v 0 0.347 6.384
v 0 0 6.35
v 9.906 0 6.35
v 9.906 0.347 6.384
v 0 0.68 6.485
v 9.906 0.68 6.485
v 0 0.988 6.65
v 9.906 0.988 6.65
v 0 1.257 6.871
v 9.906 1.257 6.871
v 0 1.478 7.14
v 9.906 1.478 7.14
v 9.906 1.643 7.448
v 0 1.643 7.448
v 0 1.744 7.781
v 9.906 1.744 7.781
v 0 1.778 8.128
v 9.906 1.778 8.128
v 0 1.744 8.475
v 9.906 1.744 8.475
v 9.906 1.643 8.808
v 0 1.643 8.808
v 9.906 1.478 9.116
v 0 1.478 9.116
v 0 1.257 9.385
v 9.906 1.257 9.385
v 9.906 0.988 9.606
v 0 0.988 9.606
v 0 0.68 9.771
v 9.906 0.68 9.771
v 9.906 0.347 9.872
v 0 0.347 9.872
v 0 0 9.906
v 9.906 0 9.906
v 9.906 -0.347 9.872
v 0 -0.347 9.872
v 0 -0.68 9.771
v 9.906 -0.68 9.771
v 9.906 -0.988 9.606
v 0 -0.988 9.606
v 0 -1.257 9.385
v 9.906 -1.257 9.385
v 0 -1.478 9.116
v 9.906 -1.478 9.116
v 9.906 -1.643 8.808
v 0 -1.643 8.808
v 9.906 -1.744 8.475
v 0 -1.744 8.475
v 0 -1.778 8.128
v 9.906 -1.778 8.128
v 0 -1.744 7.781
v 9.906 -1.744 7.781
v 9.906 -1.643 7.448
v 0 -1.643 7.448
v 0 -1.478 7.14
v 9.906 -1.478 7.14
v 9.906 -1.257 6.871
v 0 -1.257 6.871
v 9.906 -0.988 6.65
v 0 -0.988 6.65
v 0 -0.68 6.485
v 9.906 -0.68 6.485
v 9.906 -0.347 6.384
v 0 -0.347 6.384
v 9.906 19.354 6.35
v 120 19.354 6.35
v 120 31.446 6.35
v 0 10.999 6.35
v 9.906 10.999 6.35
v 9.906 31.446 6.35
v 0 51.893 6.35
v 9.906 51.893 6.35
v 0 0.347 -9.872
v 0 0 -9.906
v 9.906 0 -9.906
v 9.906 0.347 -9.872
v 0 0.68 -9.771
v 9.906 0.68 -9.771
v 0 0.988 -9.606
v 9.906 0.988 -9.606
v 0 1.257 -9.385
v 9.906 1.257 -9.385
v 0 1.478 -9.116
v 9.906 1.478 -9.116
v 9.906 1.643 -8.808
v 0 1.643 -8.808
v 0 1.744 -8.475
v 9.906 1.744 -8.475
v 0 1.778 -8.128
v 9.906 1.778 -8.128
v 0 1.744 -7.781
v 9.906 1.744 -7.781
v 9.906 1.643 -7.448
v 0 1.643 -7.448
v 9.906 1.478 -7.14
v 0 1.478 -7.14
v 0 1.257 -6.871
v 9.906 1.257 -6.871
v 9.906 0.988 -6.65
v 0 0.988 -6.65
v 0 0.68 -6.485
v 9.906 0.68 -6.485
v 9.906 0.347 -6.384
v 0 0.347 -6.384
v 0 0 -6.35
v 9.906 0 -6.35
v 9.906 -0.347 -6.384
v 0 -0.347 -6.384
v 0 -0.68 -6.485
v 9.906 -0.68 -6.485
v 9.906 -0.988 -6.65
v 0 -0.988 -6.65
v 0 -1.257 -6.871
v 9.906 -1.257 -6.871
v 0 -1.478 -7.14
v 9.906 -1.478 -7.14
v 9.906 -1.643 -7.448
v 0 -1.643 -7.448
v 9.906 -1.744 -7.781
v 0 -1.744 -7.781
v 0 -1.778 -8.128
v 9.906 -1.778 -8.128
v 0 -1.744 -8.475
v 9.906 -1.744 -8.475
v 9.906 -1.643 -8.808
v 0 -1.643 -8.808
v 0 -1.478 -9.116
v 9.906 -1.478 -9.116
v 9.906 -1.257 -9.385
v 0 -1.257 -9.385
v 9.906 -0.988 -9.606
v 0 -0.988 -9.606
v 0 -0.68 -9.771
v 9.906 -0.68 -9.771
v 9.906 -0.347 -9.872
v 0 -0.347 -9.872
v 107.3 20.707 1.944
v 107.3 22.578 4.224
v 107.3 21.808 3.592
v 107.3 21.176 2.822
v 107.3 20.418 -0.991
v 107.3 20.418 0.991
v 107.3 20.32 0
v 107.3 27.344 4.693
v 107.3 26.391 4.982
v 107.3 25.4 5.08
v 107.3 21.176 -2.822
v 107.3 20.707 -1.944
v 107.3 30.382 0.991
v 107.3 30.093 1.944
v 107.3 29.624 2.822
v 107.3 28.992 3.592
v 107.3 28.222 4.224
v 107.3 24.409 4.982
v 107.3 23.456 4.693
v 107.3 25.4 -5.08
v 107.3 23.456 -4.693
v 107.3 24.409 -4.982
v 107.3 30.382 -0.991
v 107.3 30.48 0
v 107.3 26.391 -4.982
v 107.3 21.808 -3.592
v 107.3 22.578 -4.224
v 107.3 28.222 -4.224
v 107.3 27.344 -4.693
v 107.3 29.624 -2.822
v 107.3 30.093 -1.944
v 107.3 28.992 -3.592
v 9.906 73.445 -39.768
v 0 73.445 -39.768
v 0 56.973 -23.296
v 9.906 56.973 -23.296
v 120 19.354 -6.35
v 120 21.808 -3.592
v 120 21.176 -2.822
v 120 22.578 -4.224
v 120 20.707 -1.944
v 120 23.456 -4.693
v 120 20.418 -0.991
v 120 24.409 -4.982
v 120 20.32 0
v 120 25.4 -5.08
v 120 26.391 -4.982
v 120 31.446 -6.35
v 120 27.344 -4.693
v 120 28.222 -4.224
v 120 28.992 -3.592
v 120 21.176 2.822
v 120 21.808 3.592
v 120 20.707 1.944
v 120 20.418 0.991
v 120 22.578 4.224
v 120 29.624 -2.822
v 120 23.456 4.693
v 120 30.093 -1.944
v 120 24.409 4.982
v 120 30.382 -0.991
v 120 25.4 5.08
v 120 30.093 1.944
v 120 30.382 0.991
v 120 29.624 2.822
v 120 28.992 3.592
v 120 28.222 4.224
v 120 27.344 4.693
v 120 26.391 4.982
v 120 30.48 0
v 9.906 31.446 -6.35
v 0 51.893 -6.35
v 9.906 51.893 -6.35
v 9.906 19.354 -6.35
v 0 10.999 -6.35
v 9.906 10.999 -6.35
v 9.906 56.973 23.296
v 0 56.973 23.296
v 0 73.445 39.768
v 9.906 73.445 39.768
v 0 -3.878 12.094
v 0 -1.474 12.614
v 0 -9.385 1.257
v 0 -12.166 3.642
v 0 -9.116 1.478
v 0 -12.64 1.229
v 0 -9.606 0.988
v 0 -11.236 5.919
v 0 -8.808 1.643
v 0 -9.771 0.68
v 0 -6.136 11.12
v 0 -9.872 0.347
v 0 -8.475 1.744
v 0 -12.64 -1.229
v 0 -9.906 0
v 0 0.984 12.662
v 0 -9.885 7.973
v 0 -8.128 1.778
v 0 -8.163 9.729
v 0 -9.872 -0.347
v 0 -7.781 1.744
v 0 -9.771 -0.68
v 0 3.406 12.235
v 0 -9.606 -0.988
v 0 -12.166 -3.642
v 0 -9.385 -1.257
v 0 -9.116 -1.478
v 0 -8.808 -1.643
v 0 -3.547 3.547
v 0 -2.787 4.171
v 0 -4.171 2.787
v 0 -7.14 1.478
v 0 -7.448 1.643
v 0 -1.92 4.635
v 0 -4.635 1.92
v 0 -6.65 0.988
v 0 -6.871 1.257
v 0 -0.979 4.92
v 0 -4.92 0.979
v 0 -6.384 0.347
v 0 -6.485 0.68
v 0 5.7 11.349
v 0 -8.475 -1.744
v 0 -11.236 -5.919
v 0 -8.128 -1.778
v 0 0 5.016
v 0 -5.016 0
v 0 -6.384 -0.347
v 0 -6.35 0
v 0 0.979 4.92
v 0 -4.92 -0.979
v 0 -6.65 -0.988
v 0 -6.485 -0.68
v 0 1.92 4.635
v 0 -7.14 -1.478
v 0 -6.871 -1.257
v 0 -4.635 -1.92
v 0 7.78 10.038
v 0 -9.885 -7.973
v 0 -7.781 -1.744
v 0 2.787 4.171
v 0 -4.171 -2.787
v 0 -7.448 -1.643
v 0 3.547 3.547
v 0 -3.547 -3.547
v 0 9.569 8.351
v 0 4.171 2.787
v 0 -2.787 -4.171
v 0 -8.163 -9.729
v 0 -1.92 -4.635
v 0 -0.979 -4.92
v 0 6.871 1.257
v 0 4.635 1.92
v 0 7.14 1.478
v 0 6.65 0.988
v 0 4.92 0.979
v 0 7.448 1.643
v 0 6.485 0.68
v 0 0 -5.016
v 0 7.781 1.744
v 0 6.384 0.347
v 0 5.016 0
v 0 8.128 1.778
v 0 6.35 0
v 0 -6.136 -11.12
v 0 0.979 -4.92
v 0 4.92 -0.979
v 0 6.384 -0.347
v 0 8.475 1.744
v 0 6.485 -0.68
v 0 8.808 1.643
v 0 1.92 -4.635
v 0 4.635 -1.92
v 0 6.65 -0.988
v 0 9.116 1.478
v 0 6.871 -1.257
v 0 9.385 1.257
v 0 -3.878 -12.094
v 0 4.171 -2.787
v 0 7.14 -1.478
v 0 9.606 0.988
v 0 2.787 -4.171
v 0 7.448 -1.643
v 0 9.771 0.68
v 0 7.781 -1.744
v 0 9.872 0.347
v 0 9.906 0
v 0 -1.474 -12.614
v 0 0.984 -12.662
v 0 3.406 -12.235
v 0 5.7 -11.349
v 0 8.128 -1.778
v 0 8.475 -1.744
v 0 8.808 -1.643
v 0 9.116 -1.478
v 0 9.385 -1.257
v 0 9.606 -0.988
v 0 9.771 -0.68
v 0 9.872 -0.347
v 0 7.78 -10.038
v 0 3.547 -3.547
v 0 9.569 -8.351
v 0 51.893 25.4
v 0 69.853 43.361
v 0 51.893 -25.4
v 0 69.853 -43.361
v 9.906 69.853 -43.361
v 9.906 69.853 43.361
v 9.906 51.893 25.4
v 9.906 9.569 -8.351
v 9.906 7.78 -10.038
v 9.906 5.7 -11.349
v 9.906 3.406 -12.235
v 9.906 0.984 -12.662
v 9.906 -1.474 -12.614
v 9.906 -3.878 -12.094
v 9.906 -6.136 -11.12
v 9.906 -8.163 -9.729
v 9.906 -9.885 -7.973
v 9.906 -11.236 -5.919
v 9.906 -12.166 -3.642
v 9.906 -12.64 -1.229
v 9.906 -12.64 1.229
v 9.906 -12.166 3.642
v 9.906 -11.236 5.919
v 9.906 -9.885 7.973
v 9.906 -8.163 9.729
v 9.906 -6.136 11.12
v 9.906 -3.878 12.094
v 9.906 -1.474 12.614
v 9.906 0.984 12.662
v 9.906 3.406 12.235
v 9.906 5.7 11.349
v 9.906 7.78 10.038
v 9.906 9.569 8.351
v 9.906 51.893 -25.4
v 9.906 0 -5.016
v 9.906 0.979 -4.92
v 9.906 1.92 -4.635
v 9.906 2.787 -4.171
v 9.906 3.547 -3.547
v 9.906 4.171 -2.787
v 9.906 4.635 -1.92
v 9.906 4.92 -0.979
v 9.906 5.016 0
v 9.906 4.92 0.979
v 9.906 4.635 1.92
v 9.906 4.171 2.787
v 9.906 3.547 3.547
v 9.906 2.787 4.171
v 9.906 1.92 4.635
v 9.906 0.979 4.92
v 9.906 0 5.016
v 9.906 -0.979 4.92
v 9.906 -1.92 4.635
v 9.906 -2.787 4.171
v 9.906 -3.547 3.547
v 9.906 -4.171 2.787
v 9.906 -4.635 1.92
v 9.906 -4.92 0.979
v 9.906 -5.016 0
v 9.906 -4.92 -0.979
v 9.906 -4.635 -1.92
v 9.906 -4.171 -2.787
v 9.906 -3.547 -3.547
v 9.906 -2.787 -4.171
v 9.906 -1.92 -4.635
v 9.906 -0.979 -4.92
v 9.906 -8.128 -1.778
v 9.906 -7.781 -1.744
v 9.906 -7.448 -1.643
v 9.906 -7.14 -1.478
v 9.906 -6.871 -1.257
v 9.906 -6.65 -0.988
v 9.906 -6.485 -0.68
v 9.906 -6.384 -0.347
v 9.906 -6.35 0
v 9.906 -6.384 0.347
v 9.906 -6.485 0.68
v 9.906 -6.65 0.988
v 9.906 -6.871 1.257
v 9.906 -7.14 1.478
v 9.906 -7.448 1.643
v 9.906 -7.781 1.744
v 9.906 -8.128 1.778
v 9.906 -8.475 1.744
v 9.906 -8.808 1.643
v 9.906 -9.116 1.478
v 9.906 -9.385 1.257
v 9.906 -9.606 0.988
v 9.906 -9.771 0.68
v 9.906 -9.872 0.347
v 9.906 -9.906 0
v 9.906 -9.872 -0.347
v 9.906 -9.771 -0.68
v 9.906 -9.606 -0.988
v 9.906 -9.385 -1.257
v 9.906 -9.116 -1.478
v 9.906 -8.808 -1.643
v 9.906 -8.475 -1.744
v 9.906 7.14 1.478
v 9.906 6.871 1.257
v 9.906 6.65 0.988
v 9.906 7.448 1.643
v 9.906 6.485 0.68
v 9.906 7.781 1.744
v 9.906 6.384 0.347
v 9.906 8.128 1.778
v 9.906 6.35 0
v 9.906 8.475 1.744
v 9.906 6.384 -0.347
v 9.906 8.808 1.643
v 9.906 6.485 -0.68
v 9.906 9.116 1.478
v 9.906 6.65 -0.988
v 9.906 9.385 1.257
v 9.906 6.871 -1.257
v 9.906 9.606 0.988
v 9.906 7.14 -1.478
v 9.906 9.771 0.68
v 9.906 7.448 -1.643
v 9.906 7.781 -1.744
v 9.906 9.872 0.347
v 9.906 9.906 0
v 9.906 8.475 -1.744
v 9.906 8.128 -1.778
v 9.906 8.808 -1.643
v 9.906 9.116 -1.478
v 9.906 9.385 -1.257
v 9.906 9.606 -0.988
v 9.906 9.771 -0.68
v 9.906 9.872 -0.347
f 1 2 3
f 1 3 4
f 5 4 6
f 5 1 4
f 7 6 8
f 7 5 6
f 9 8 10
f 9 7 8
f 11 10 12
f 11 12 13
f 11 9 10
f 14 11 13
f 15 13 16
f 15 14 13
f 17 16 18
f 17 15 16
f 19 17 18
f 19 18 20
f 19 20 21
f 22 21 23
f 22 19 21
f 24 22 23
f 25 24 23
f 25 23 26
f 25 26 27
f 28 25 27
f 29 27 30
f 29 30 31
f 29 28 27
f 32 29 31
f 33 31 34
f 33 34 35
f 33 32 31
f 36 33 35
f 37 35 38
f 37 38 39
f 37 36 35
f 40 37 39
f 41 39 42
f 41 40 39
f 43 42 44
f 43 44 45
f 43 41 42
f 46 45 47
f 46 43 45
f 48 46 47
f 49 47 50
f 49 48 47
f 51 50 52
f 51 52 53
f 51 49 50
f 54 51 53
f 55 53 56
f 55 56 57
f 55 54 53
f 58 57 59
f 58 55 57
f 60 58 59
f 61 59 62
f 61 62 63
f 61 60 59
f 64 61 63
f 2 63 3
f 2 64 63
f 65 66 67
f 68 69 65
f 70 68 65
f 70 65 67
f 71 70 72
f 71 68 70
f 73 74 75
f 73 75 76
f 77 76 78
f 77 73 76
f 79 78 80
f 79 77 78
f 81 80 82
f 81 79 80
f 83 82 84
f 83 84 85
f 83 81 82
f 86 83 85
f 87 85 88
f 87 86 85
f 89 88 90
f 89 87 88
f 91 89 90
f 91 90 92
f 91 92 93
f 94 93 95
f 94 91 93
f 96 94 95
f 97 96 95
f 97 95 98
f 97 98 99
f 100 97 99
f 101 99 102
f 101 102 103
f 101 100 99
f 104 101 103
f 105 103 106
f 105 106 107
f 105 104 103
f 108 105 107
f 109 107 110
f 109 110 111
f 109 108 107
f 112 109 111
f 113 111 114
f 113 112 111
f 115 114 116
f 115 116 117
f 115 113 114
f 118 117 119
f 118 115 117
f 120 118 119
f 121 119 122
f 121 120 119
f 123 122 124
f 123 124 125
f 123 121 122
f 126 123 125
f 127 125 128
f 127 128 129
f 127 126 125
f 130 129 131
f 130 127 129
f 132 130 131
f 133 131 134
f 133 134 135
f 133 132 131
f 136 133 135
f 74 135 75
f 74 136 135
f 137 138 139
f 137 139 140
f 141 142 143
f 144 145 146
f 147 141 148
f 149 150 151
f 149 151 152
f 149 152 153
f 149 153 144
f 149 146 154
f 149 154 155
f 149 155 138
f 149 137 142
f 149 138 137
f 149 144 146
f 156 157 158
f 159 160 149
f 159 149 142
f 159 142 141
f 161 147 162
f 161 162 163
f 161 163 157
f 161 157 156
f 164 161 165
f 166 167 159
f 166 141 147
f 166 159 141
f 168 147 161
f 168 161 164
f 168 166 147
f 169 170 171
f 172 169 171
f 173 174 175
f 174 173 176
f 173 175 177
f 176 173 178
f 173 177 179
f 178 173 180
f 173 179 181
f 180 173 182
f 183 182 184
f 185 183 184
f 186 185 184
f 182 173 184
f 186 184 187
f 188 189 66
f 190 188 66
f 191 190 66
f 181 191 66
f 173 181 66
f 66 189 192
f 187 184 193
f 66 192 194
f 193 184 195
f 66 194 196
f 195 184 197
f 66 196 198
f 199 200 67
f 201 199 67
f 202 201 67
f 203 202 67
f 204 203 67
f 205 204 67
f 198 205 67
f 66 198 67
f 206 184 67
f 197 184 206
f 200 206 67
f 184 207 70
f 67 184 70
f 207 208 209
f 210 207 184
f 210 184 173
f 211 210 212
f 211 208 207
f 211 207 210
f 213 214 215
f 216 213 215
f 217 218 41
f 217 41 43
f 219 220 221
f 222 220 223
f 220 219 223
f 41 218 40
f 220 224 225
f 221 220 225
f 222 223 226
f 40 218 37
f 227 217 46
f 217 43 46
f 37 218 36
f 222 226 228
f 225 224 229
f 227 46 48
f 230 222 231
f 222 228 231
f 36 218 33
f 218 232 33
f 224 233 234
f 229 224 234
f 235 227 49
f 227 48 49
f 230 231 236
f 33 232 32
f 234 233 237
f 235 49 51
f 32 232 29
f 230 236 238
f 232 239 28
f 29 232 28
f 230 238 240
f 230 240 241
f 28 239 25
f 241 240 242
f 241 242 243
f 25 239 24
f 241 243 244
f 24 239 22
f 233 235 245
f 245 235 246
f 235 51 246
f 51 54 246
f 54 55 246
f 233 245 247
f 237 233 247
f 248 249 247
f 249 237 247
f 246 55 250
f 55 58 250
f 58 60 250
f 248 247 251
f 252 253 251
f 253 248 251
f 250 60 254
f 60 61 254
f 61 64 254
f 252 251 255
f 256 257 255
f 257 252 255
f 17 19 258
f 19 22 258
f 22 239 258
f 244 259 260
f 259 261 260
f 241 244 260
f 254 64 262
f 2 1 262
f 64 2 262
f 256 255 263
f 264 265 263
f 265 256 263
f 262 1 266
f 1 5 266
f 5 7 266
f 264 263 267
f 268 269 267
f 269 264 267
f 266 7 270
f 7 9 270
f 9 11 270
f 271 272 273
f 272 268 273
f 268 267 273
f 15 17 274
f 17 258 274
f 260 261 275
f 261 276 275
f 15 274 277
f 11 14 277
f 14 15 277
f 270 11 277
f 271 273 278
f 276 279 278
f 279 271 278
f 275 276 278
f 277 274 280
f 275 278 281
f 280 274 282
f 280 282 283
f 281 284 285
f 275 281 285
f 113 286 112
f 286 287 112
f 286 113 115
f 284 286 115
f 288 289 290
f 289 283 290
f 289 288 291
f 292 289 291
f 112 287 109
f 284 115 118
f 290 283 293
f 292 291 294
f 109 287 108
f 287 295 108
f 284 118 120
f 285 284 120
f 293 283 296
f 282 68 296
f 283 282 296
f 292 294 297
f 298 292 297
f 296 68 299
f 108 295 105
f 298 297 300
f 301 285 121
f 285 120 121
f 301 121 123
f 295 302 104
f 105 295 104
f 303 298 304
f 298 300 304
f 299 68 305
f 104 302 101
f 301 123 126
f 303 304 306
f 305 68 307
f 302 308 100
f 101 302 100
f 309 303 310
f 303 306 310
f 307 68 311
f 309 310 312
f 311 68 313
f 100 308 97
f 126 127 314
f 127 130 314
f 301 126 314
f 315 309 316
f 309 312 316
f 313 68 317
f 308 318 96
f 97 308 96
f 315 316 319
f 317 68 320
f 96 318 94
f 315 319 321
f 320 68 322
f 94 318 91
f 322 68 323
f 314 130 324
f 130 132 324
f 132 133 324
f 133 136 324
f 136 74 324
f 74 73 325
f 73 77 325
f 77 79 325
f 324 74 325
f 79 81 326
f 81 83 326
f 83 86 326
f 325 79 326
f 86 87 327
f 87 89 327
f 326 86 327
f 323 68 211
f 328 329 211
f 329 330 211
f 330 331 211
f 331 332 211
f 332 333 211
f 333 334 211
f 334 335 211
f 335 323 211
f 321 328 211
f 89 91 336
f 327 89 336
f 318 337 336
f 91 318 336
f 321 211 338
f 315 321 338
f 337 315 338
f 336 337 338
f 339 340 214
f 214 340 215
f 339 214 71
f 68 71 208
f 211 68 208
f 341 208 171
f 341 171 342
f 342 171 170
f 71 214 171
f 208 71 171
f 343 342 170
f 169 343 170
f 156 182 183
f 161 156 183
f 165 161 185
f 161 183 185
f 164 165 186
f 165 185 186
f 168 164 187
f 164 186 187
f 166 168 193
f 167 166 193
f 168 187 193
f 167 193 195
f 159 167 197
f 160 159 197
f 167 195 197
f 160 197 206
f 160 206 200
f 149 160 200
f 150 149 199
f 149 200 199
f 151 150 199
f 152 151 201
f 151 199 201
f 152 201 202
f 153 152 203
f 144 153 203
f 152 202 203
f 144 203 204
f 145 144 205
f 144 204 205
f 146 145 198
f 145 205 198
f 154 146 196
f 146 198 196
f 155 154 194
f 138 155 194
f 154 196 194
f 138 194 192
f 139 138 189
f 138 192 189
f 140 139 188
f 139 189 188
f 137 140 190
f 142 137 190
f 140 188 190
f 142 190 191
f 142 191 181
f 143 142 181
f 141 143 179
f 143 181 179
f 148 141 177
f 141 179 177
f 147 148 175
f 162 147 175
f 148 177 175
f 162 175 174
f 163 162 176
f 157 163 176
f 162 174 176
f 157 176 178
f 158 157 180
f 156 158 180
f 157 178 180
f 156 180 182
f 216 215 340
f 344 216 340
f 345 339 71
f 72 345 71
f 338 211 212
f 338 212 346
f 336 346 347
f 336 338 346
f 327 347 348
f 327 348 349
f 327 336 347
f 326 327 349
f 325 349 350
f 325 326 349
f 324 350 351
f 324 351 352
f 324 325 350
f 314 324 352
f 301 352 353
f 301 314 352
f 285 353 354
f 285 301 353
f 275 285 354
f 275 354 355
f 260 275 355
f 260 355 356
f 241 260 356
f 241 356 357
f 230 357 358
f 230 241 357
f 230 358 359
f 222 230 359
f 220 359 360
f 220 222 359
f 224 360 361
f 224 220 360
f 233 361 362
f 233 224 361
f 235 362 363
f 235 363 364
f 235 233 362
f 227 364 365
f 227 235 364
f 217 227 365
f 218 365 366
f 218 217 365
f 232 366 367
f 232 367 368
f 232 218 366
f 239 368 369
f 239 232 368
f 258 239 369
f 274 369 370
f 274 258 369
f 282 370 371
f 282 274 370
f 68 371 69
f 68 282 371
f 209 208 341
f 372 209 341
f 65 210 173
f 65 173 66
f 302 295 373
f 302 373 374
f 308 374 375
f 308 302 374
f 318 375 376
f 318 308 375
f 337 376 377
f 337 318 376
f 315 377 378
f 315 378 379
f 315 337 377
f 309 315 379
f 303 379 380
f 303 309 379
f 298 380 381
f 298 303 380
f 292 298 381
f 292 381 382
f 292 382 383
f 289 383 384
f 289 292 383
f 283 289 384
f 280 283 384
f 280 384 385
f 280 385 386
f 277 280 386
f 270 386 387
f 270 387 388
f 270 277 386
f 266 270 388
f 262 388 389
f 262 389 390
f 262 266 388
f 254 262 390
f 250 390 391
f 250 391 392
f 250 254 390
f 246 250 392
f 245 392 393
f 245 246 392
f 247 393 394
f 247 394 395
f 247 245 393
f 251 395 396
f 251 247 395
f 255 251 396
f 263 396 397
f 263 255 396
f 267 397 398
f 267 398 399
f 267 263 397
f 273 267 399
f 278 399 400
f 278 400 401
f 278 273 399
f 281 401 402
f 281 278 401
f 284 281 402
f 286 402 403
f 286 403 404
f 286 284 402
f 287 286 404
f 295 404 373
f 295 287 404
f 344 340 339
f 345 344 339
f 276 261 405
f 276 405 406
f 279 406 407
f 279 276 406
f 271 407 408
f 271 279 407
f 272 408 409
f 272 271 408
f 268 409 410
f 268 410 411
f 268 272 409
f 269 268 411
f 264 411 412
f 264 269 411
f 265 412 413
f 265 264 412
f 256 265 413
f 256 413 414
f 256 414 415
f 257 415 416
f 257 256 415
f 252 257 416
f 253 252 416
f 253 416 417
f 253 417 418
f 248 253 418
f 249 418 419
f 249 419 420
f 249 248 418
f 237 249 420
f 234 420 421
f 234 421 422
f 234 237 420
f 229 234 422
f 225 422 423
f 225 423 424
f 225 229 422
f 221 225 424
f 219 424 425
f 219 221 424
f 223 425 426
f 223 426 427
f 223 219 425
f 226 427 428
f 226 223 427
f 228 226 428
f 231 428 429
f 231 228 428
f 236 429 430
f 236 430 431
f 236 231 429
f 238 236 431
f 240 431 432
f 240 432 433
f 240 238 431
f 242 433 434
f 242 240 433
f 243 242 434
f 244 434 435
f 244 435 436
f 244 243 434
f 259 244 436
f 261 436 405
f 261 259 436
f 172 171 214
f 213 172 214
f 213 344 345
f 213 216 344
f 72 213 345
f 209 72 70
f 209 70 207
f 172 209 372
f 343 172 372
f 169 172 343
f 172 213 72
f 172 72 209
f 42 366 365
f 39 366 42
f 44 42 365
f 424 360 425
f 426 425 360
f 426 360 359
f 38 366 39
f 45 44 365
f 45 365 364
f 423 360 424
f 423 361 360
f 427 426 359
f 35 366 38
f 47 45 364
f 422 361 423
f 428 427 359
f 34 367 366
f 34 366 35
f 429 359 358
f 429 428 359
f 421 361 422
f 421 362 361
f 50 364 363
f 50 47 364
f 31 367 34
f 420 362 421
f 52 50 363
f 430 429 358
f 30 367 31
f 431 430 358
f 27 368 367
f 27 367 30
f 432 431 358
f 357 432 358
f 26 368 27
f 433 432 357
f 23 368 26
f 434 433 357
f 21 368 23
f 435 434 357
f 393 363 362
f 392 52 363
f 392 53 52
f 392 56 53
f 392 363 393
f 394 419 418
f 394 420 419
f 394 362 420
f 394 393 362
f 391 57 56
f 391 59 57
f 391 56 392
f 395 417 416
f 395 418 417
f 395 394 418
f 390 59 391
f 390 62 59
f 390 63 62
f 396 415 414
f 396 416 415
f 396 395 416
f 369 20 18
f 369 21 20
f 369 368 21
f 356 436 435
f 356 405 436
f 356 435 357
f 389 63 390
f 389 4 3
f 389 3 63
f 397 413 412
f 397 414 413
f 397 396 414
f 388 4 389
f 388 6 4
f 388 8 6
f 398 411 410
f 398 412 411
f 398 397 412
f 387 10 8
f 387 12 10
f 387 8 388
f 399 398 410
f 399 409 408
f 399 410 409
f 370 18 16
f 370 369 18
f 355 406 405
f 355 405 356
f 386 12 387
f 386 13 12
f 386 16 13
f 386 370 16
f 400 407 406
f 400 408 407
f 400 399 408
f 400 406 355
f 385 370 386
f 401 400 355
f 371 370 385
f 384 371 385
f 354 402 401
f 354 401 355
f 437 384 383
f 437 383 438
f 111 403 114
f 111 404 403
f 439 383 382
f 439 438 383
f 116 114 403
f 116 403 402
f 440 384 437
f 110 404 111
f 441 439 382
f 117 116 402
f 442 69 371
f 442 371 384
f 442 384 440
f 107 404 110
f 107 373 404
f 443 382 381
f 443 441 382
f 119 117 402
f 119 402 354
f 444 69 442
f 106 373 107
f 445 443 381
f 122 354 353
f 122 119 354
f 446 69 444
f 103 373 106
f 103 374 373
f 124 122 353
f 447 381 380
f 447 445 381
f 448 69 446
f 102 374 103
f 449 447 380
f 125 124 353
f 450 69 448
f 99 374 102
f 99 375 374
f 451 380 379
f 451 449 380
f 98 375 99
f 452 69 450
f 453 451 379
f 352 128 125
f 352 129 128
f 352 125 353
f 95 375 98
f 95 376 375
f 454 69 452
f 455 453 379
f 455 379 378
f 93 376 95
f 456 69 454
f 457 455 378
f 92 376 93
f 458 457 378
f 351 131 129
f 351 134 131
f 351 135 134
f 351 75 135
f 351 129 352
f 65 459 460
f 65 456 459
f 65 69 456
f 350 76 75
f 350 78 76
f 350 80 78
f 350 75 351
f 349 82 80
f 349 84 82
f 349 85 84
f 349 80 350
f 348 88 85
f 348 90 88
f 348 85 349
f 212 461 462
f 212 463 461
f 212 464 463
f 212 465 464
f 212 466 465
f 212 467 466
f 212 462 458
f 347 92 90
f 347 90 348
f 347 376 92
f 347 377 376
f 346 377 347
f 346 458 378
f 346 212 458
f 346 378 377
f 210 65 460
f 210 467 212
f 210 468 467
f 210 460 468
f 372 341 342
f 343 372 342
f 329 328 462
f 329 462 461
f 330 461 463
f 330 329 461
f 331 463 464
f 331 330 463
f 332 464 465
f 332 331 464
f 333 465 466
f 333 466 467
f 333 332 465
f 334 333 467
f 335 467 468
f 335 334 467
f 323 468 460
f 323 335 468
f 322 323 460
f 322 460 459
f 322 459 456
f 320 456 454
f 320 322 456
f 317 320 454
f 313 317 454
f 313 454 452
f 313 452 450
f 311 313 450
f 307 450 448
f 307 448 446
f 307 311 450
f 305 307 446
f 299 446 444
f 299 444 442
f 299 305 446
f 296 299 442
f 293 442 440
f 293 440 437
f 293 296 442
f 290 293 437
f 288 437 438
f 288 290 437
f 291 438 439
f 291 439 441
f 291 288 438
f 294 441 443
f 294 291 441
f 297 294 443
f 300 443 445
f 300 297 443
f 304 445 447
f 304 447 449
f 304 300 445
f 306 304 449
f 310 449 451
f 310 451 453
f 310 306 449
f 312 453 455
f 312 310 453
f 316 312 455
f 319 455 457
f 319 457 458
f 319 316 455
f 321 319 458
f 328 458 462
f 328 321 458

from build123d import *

# Parameters (mm, degrees)
SKETCH1_R           = 5.0165
SKETCH1_R_2         = 1.778
BOSS_EXTRUDE1_DEPTH = 9.906
BOSS_EXTRUDE2_DEPTH = 9.906
BOSS_EXTRUDE3_START = -9.906
SKETCH4_W           = 12.7
SKETCH4_H           = 12.091045256
BOSS_EXTRUDE3_DEPTH = 110.094000005
SKETCH5_R           = 5.08
CUT_EXTRUDE1_DEPTH  = 12.7


with BuildPart() as part:
    # Sketch1 → Boss-Extrude1 (new body)
    with BuildSketch(Plane(origin=(0, 0, 0), x_dir=(0, 0, -1), z_dir=(1, 0, 0))):
        with BuildLine():
            Line((-6.35, 10.998522628), (-6.35, 51.892522628))
            Line((-6.35, 51.892522628), (6.35, 51.892522628))
            Line((6.35, 51.892522628), (6.35, 10.998522628))
            ThreePointArc((6.35, 10.998522628), (0, -12.7), (-6.35, 10.998522628))
        make_face()
        Circle(SKETCH1_R, mode=Mode.SUBTRACT)
        with Locations((-8.128, 0)):
            Circle(SKETCH1_R_2, mode=Mode.SUBTRACT)
        with Locations((0, 8.128)):
            Circle(SKETCH1_R_2, mode=Mode.SUBTRACT)
        with Locations((8.128, 0)):
            Circle(SKETCH1_R_2, mode=Mode.SUBTRACT)
        with Locations((0, -8.128)):
            Circle(SKETCH1_R_2, mode=Mode.SUBTRACT)
    extrude(amount=BOSS_EXTRUDE1_DEPTH)

    # Sketch3 → Boss-Extrude2 (add)
    with BuildSketch(Plane(origin=(0, 0, 0), x_dir=(0, 0, -1), z_dir=(1, 0, 0))):
        Polygon((-25.4, 51.892522628), (0, 51.892522628), (0, 56.972522628), (-23.295795103, 56.972522628), (-39.768409794, 73.445137319), (-43.360512242, 69.85303487), align=None)
        Polygon((0, 51.892522628), (25.4, 51.892522628), (43.360512242, 69.85303487), (39.768409794, 73.445137319), (23.295795103, 56.972522628), (0, 56.972522628), align=None)
    extrude(amount=BOSS_EXTRUDE2_DEPTH)

    # Sketch4 → Boss-Extrude3 (add)
    with BuildSketch(Plane.ZY.offset(BOSS_EXTRUDE3_START)):
        with Locations((0, 25.4)):
            Rectangle(SKETCH4_W, SKETCH4_H)
    extrude(amount=-BOSS_EXTRUDE3_DEPTH)

    # Sketch5 → Cut-Extrude1 (cut)
    with BuildSketch(Plane(origin=(120.000000005, 0, 0), x_dir=(0, 0, -1), z_dir=(1, 0, 0))):
        with Locations((0, 25.4)):
            Circle(SKETCH5_R)
    extrude(amount=-CUT_EXTRUDE1_DEPTH, mode=Mode.SUBTRACT)


solid = part.part
